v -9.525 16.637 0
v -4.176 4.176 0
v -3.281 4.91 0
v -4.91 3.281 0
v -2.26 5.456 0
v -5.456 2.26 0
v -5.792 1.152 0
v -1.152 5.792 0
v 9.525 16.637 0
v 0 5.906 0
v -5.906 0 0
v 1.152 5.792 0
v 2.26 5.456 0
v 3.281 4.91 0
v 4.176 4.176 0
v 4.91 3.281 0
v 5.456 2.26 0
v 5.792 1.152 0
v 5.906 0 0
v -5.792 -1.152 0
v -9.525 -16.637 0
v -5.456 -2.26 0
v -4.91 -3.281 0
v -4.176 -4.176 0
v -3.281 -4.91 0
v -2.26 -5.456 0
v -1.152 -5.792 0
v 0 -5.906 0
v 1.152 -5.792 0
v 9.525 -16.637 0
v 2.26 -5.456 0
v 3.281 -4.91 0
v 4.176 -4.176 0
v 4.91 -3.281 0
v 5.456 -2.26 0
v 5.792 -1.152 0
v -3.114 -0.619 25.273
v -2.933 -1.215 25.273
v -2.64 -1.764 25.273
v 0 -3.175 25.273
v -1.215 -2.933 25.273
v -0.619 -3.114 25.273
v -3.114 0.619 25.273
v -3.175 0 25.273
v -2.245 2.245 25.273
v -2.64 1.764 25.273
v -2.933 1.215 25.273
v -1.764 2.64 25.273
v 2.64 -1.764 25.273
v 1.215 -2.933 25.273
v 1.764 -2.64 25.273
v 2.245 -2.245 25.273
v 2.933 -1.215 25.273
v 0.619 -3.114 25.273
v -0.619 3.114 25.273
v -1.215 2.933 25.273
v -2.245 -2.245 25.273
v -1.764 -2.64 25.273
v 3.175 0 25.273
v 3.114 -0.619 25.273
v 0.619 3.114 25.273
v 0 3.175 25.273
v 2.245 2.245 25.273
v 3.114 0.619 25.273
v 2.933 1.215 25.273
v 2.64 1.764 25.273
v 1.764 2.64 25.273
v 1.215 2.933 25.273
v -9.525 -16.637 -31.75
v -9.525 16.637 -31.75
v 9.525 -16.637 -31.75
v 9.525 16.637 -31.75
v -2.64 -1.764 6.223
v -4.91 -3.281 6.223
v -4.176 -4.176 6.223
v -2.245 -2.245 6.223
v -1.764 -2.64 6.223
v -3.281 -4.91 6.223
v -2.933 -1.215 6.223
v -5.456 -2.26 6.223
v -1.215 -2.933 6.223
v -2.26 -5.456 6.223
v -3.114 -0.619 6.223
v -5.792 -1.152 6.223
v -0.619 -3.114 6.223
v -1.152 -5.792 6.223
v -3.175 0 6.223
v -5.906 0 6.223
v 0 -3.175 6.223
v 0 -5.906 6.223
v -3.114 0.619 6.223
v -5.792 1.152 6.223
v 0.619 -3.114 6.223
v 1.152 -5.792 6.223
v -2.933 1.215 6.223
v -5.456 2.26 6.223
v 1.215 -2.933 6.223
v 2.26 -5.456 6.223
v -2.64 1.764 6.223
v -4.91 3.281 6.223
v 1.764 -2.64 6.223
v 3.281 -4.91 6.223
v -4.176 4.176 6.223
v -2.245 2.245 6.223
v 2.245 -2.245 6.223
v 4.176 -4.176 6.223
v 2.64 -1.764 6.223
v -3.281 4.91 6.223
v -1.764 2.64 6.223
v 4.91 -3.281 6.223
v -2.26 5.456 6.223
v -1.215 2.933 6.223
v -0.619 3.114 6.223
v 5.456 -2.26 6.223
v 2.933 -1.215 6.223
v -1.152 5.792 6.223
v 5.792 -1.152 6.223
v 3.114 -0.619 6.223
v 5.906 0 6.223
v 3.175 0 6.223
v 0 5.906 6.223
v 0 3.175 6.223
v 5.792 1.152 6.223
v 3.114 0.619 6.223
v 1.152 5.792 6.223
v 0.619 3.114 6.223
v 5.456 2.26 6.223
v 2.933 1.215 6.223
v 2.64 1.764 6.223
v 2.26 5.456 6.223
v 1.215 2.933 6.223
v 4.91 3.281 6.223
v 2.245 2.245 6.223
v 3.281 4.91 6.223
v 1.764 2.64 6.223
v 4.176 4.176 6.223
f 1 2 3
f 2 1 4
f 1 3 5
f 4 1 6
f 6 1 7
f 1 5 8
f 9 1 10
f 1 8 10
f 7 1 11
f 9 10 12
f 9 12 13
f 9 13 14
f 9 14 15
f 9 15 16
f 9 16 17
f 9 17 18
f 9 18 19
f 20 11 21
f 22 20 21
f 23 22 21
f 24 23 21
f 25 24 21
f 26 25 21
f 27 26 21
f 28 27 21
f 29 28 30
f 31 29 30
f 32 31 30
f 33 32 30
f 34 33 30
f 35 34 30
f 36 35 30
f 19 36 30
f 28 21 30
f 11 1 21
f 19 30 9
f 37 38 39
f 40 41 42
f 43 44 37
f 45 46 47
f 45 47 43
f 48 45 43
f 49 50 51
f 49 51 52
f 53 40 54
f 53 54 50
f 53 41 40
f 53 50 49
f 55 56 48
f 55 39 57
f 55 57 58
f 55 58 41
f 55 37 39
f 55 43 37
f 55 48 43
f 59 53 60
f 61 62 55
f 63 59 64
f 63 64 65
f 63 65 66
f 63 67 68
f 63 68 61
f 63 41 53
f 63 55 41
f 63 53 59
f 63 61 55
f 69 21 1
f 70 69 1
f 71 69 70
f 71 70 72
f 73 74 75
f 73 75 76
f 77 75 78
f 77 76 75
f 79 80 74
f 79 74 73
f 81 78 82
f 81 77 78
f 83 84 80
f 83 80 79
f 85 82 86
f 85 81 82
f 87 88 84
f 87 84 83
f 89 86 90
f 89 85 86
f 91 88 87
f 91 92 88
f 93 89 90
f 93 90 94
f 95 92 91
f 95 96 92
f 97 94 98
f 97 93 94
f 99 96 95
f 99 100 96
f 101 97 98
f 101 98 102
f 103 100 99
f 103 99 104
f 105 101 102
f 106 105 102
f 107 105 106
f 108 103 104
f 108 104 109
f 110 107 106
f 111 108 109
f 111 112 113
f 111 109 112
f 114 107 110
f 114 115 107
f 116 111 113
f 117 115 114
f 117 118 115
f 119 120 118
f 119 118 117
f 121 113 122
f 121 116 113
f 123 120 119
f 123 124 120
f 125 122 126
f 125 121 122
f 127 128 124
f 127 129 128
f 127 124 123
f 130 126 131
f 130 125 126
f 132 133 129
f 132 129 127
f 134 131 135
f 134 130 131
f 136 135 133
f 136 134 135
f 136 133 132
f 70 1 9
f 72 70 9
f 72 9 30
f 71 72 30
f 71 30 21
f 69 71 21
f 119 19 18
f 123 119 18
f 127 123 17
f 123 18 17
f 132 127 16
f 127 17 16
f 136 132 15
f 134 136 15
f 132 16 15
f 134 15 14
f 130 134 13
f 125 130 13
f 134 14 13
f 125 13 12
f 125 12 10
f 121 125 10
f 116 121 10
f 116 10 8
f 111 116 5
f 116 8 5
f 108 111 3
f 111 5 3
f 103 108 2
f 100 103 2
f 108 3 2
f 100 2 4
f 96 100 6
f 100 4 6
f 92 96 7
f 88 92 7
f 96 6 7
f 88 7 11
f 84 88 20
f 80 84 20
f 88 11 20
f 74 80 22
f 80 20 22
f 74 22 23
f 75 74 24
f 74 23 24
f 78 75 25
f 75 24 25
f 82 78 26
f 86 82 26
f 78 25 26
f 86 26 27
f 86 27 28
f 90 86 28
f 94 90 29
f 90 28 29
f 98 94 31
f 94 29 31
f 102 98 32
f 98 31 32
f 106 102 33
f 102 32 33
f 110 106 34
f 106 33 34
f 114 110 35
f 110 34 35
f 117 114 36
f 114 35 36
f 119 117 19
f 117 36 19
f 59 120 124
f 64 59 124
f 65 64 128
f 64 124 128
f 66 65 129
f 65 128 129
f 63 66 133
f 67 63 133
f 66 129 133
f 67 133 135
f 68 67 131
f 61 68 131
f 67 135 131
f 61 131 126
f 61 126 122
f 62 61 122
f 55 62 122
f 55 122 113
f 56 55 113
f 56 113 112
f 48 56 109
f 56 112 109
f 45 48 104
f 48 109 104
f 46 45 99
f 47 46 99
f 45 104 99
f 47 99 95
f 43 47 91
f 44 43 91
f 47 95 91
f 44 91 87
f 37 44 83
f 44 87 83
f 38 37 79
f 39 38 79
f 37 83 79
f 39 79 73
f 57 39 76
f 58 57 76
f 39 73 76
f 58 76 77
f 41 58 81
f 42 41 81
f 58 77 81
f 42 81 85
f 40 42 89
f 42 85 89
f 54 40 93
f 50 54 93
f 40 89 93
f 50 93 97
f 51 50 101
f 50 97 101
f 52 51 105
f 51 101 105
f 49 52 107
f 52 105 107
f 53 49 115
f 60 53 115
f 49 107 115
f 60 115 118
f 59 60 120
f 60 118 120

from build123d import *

# Parameters (mm, degrees)
F0_R     = 5.9055
F1_DEPTH = 6.223
F2_R     = 3.175
F3_DEPTH = 19.05
F5_DEPTH = 31.75


with BuildPart() as f1:
    # F0 (on Top) → F1 (new body)
    with BuildSketch(Plane.XY):
        Circle(F0_R)
    extrude(amount=F1_DEPTH)

    # F2 (on face) → F3 (join)
    with BuildSketch(Plane.XY.offset(6.223)):
        Circle(F2_R)
    extrude(amount=F3_DEPTH)

    # F4 (on face) → F5 (join)
    with BuildSketch(Plane(origin=(0, 0, 0), x_dir=(1, 0, 0), z_dir=(0, 0, -1))):
        Polygon((9.525, -16.637), (-9.525, 16.637), (-9.525, -16.637), align=None)
        Polygon((9.525, 16.637), (-9.525, 16.637), (9.525, -16.637), align=None)
    extrude(amount=F5_DEPTH)


solid = f1.part
